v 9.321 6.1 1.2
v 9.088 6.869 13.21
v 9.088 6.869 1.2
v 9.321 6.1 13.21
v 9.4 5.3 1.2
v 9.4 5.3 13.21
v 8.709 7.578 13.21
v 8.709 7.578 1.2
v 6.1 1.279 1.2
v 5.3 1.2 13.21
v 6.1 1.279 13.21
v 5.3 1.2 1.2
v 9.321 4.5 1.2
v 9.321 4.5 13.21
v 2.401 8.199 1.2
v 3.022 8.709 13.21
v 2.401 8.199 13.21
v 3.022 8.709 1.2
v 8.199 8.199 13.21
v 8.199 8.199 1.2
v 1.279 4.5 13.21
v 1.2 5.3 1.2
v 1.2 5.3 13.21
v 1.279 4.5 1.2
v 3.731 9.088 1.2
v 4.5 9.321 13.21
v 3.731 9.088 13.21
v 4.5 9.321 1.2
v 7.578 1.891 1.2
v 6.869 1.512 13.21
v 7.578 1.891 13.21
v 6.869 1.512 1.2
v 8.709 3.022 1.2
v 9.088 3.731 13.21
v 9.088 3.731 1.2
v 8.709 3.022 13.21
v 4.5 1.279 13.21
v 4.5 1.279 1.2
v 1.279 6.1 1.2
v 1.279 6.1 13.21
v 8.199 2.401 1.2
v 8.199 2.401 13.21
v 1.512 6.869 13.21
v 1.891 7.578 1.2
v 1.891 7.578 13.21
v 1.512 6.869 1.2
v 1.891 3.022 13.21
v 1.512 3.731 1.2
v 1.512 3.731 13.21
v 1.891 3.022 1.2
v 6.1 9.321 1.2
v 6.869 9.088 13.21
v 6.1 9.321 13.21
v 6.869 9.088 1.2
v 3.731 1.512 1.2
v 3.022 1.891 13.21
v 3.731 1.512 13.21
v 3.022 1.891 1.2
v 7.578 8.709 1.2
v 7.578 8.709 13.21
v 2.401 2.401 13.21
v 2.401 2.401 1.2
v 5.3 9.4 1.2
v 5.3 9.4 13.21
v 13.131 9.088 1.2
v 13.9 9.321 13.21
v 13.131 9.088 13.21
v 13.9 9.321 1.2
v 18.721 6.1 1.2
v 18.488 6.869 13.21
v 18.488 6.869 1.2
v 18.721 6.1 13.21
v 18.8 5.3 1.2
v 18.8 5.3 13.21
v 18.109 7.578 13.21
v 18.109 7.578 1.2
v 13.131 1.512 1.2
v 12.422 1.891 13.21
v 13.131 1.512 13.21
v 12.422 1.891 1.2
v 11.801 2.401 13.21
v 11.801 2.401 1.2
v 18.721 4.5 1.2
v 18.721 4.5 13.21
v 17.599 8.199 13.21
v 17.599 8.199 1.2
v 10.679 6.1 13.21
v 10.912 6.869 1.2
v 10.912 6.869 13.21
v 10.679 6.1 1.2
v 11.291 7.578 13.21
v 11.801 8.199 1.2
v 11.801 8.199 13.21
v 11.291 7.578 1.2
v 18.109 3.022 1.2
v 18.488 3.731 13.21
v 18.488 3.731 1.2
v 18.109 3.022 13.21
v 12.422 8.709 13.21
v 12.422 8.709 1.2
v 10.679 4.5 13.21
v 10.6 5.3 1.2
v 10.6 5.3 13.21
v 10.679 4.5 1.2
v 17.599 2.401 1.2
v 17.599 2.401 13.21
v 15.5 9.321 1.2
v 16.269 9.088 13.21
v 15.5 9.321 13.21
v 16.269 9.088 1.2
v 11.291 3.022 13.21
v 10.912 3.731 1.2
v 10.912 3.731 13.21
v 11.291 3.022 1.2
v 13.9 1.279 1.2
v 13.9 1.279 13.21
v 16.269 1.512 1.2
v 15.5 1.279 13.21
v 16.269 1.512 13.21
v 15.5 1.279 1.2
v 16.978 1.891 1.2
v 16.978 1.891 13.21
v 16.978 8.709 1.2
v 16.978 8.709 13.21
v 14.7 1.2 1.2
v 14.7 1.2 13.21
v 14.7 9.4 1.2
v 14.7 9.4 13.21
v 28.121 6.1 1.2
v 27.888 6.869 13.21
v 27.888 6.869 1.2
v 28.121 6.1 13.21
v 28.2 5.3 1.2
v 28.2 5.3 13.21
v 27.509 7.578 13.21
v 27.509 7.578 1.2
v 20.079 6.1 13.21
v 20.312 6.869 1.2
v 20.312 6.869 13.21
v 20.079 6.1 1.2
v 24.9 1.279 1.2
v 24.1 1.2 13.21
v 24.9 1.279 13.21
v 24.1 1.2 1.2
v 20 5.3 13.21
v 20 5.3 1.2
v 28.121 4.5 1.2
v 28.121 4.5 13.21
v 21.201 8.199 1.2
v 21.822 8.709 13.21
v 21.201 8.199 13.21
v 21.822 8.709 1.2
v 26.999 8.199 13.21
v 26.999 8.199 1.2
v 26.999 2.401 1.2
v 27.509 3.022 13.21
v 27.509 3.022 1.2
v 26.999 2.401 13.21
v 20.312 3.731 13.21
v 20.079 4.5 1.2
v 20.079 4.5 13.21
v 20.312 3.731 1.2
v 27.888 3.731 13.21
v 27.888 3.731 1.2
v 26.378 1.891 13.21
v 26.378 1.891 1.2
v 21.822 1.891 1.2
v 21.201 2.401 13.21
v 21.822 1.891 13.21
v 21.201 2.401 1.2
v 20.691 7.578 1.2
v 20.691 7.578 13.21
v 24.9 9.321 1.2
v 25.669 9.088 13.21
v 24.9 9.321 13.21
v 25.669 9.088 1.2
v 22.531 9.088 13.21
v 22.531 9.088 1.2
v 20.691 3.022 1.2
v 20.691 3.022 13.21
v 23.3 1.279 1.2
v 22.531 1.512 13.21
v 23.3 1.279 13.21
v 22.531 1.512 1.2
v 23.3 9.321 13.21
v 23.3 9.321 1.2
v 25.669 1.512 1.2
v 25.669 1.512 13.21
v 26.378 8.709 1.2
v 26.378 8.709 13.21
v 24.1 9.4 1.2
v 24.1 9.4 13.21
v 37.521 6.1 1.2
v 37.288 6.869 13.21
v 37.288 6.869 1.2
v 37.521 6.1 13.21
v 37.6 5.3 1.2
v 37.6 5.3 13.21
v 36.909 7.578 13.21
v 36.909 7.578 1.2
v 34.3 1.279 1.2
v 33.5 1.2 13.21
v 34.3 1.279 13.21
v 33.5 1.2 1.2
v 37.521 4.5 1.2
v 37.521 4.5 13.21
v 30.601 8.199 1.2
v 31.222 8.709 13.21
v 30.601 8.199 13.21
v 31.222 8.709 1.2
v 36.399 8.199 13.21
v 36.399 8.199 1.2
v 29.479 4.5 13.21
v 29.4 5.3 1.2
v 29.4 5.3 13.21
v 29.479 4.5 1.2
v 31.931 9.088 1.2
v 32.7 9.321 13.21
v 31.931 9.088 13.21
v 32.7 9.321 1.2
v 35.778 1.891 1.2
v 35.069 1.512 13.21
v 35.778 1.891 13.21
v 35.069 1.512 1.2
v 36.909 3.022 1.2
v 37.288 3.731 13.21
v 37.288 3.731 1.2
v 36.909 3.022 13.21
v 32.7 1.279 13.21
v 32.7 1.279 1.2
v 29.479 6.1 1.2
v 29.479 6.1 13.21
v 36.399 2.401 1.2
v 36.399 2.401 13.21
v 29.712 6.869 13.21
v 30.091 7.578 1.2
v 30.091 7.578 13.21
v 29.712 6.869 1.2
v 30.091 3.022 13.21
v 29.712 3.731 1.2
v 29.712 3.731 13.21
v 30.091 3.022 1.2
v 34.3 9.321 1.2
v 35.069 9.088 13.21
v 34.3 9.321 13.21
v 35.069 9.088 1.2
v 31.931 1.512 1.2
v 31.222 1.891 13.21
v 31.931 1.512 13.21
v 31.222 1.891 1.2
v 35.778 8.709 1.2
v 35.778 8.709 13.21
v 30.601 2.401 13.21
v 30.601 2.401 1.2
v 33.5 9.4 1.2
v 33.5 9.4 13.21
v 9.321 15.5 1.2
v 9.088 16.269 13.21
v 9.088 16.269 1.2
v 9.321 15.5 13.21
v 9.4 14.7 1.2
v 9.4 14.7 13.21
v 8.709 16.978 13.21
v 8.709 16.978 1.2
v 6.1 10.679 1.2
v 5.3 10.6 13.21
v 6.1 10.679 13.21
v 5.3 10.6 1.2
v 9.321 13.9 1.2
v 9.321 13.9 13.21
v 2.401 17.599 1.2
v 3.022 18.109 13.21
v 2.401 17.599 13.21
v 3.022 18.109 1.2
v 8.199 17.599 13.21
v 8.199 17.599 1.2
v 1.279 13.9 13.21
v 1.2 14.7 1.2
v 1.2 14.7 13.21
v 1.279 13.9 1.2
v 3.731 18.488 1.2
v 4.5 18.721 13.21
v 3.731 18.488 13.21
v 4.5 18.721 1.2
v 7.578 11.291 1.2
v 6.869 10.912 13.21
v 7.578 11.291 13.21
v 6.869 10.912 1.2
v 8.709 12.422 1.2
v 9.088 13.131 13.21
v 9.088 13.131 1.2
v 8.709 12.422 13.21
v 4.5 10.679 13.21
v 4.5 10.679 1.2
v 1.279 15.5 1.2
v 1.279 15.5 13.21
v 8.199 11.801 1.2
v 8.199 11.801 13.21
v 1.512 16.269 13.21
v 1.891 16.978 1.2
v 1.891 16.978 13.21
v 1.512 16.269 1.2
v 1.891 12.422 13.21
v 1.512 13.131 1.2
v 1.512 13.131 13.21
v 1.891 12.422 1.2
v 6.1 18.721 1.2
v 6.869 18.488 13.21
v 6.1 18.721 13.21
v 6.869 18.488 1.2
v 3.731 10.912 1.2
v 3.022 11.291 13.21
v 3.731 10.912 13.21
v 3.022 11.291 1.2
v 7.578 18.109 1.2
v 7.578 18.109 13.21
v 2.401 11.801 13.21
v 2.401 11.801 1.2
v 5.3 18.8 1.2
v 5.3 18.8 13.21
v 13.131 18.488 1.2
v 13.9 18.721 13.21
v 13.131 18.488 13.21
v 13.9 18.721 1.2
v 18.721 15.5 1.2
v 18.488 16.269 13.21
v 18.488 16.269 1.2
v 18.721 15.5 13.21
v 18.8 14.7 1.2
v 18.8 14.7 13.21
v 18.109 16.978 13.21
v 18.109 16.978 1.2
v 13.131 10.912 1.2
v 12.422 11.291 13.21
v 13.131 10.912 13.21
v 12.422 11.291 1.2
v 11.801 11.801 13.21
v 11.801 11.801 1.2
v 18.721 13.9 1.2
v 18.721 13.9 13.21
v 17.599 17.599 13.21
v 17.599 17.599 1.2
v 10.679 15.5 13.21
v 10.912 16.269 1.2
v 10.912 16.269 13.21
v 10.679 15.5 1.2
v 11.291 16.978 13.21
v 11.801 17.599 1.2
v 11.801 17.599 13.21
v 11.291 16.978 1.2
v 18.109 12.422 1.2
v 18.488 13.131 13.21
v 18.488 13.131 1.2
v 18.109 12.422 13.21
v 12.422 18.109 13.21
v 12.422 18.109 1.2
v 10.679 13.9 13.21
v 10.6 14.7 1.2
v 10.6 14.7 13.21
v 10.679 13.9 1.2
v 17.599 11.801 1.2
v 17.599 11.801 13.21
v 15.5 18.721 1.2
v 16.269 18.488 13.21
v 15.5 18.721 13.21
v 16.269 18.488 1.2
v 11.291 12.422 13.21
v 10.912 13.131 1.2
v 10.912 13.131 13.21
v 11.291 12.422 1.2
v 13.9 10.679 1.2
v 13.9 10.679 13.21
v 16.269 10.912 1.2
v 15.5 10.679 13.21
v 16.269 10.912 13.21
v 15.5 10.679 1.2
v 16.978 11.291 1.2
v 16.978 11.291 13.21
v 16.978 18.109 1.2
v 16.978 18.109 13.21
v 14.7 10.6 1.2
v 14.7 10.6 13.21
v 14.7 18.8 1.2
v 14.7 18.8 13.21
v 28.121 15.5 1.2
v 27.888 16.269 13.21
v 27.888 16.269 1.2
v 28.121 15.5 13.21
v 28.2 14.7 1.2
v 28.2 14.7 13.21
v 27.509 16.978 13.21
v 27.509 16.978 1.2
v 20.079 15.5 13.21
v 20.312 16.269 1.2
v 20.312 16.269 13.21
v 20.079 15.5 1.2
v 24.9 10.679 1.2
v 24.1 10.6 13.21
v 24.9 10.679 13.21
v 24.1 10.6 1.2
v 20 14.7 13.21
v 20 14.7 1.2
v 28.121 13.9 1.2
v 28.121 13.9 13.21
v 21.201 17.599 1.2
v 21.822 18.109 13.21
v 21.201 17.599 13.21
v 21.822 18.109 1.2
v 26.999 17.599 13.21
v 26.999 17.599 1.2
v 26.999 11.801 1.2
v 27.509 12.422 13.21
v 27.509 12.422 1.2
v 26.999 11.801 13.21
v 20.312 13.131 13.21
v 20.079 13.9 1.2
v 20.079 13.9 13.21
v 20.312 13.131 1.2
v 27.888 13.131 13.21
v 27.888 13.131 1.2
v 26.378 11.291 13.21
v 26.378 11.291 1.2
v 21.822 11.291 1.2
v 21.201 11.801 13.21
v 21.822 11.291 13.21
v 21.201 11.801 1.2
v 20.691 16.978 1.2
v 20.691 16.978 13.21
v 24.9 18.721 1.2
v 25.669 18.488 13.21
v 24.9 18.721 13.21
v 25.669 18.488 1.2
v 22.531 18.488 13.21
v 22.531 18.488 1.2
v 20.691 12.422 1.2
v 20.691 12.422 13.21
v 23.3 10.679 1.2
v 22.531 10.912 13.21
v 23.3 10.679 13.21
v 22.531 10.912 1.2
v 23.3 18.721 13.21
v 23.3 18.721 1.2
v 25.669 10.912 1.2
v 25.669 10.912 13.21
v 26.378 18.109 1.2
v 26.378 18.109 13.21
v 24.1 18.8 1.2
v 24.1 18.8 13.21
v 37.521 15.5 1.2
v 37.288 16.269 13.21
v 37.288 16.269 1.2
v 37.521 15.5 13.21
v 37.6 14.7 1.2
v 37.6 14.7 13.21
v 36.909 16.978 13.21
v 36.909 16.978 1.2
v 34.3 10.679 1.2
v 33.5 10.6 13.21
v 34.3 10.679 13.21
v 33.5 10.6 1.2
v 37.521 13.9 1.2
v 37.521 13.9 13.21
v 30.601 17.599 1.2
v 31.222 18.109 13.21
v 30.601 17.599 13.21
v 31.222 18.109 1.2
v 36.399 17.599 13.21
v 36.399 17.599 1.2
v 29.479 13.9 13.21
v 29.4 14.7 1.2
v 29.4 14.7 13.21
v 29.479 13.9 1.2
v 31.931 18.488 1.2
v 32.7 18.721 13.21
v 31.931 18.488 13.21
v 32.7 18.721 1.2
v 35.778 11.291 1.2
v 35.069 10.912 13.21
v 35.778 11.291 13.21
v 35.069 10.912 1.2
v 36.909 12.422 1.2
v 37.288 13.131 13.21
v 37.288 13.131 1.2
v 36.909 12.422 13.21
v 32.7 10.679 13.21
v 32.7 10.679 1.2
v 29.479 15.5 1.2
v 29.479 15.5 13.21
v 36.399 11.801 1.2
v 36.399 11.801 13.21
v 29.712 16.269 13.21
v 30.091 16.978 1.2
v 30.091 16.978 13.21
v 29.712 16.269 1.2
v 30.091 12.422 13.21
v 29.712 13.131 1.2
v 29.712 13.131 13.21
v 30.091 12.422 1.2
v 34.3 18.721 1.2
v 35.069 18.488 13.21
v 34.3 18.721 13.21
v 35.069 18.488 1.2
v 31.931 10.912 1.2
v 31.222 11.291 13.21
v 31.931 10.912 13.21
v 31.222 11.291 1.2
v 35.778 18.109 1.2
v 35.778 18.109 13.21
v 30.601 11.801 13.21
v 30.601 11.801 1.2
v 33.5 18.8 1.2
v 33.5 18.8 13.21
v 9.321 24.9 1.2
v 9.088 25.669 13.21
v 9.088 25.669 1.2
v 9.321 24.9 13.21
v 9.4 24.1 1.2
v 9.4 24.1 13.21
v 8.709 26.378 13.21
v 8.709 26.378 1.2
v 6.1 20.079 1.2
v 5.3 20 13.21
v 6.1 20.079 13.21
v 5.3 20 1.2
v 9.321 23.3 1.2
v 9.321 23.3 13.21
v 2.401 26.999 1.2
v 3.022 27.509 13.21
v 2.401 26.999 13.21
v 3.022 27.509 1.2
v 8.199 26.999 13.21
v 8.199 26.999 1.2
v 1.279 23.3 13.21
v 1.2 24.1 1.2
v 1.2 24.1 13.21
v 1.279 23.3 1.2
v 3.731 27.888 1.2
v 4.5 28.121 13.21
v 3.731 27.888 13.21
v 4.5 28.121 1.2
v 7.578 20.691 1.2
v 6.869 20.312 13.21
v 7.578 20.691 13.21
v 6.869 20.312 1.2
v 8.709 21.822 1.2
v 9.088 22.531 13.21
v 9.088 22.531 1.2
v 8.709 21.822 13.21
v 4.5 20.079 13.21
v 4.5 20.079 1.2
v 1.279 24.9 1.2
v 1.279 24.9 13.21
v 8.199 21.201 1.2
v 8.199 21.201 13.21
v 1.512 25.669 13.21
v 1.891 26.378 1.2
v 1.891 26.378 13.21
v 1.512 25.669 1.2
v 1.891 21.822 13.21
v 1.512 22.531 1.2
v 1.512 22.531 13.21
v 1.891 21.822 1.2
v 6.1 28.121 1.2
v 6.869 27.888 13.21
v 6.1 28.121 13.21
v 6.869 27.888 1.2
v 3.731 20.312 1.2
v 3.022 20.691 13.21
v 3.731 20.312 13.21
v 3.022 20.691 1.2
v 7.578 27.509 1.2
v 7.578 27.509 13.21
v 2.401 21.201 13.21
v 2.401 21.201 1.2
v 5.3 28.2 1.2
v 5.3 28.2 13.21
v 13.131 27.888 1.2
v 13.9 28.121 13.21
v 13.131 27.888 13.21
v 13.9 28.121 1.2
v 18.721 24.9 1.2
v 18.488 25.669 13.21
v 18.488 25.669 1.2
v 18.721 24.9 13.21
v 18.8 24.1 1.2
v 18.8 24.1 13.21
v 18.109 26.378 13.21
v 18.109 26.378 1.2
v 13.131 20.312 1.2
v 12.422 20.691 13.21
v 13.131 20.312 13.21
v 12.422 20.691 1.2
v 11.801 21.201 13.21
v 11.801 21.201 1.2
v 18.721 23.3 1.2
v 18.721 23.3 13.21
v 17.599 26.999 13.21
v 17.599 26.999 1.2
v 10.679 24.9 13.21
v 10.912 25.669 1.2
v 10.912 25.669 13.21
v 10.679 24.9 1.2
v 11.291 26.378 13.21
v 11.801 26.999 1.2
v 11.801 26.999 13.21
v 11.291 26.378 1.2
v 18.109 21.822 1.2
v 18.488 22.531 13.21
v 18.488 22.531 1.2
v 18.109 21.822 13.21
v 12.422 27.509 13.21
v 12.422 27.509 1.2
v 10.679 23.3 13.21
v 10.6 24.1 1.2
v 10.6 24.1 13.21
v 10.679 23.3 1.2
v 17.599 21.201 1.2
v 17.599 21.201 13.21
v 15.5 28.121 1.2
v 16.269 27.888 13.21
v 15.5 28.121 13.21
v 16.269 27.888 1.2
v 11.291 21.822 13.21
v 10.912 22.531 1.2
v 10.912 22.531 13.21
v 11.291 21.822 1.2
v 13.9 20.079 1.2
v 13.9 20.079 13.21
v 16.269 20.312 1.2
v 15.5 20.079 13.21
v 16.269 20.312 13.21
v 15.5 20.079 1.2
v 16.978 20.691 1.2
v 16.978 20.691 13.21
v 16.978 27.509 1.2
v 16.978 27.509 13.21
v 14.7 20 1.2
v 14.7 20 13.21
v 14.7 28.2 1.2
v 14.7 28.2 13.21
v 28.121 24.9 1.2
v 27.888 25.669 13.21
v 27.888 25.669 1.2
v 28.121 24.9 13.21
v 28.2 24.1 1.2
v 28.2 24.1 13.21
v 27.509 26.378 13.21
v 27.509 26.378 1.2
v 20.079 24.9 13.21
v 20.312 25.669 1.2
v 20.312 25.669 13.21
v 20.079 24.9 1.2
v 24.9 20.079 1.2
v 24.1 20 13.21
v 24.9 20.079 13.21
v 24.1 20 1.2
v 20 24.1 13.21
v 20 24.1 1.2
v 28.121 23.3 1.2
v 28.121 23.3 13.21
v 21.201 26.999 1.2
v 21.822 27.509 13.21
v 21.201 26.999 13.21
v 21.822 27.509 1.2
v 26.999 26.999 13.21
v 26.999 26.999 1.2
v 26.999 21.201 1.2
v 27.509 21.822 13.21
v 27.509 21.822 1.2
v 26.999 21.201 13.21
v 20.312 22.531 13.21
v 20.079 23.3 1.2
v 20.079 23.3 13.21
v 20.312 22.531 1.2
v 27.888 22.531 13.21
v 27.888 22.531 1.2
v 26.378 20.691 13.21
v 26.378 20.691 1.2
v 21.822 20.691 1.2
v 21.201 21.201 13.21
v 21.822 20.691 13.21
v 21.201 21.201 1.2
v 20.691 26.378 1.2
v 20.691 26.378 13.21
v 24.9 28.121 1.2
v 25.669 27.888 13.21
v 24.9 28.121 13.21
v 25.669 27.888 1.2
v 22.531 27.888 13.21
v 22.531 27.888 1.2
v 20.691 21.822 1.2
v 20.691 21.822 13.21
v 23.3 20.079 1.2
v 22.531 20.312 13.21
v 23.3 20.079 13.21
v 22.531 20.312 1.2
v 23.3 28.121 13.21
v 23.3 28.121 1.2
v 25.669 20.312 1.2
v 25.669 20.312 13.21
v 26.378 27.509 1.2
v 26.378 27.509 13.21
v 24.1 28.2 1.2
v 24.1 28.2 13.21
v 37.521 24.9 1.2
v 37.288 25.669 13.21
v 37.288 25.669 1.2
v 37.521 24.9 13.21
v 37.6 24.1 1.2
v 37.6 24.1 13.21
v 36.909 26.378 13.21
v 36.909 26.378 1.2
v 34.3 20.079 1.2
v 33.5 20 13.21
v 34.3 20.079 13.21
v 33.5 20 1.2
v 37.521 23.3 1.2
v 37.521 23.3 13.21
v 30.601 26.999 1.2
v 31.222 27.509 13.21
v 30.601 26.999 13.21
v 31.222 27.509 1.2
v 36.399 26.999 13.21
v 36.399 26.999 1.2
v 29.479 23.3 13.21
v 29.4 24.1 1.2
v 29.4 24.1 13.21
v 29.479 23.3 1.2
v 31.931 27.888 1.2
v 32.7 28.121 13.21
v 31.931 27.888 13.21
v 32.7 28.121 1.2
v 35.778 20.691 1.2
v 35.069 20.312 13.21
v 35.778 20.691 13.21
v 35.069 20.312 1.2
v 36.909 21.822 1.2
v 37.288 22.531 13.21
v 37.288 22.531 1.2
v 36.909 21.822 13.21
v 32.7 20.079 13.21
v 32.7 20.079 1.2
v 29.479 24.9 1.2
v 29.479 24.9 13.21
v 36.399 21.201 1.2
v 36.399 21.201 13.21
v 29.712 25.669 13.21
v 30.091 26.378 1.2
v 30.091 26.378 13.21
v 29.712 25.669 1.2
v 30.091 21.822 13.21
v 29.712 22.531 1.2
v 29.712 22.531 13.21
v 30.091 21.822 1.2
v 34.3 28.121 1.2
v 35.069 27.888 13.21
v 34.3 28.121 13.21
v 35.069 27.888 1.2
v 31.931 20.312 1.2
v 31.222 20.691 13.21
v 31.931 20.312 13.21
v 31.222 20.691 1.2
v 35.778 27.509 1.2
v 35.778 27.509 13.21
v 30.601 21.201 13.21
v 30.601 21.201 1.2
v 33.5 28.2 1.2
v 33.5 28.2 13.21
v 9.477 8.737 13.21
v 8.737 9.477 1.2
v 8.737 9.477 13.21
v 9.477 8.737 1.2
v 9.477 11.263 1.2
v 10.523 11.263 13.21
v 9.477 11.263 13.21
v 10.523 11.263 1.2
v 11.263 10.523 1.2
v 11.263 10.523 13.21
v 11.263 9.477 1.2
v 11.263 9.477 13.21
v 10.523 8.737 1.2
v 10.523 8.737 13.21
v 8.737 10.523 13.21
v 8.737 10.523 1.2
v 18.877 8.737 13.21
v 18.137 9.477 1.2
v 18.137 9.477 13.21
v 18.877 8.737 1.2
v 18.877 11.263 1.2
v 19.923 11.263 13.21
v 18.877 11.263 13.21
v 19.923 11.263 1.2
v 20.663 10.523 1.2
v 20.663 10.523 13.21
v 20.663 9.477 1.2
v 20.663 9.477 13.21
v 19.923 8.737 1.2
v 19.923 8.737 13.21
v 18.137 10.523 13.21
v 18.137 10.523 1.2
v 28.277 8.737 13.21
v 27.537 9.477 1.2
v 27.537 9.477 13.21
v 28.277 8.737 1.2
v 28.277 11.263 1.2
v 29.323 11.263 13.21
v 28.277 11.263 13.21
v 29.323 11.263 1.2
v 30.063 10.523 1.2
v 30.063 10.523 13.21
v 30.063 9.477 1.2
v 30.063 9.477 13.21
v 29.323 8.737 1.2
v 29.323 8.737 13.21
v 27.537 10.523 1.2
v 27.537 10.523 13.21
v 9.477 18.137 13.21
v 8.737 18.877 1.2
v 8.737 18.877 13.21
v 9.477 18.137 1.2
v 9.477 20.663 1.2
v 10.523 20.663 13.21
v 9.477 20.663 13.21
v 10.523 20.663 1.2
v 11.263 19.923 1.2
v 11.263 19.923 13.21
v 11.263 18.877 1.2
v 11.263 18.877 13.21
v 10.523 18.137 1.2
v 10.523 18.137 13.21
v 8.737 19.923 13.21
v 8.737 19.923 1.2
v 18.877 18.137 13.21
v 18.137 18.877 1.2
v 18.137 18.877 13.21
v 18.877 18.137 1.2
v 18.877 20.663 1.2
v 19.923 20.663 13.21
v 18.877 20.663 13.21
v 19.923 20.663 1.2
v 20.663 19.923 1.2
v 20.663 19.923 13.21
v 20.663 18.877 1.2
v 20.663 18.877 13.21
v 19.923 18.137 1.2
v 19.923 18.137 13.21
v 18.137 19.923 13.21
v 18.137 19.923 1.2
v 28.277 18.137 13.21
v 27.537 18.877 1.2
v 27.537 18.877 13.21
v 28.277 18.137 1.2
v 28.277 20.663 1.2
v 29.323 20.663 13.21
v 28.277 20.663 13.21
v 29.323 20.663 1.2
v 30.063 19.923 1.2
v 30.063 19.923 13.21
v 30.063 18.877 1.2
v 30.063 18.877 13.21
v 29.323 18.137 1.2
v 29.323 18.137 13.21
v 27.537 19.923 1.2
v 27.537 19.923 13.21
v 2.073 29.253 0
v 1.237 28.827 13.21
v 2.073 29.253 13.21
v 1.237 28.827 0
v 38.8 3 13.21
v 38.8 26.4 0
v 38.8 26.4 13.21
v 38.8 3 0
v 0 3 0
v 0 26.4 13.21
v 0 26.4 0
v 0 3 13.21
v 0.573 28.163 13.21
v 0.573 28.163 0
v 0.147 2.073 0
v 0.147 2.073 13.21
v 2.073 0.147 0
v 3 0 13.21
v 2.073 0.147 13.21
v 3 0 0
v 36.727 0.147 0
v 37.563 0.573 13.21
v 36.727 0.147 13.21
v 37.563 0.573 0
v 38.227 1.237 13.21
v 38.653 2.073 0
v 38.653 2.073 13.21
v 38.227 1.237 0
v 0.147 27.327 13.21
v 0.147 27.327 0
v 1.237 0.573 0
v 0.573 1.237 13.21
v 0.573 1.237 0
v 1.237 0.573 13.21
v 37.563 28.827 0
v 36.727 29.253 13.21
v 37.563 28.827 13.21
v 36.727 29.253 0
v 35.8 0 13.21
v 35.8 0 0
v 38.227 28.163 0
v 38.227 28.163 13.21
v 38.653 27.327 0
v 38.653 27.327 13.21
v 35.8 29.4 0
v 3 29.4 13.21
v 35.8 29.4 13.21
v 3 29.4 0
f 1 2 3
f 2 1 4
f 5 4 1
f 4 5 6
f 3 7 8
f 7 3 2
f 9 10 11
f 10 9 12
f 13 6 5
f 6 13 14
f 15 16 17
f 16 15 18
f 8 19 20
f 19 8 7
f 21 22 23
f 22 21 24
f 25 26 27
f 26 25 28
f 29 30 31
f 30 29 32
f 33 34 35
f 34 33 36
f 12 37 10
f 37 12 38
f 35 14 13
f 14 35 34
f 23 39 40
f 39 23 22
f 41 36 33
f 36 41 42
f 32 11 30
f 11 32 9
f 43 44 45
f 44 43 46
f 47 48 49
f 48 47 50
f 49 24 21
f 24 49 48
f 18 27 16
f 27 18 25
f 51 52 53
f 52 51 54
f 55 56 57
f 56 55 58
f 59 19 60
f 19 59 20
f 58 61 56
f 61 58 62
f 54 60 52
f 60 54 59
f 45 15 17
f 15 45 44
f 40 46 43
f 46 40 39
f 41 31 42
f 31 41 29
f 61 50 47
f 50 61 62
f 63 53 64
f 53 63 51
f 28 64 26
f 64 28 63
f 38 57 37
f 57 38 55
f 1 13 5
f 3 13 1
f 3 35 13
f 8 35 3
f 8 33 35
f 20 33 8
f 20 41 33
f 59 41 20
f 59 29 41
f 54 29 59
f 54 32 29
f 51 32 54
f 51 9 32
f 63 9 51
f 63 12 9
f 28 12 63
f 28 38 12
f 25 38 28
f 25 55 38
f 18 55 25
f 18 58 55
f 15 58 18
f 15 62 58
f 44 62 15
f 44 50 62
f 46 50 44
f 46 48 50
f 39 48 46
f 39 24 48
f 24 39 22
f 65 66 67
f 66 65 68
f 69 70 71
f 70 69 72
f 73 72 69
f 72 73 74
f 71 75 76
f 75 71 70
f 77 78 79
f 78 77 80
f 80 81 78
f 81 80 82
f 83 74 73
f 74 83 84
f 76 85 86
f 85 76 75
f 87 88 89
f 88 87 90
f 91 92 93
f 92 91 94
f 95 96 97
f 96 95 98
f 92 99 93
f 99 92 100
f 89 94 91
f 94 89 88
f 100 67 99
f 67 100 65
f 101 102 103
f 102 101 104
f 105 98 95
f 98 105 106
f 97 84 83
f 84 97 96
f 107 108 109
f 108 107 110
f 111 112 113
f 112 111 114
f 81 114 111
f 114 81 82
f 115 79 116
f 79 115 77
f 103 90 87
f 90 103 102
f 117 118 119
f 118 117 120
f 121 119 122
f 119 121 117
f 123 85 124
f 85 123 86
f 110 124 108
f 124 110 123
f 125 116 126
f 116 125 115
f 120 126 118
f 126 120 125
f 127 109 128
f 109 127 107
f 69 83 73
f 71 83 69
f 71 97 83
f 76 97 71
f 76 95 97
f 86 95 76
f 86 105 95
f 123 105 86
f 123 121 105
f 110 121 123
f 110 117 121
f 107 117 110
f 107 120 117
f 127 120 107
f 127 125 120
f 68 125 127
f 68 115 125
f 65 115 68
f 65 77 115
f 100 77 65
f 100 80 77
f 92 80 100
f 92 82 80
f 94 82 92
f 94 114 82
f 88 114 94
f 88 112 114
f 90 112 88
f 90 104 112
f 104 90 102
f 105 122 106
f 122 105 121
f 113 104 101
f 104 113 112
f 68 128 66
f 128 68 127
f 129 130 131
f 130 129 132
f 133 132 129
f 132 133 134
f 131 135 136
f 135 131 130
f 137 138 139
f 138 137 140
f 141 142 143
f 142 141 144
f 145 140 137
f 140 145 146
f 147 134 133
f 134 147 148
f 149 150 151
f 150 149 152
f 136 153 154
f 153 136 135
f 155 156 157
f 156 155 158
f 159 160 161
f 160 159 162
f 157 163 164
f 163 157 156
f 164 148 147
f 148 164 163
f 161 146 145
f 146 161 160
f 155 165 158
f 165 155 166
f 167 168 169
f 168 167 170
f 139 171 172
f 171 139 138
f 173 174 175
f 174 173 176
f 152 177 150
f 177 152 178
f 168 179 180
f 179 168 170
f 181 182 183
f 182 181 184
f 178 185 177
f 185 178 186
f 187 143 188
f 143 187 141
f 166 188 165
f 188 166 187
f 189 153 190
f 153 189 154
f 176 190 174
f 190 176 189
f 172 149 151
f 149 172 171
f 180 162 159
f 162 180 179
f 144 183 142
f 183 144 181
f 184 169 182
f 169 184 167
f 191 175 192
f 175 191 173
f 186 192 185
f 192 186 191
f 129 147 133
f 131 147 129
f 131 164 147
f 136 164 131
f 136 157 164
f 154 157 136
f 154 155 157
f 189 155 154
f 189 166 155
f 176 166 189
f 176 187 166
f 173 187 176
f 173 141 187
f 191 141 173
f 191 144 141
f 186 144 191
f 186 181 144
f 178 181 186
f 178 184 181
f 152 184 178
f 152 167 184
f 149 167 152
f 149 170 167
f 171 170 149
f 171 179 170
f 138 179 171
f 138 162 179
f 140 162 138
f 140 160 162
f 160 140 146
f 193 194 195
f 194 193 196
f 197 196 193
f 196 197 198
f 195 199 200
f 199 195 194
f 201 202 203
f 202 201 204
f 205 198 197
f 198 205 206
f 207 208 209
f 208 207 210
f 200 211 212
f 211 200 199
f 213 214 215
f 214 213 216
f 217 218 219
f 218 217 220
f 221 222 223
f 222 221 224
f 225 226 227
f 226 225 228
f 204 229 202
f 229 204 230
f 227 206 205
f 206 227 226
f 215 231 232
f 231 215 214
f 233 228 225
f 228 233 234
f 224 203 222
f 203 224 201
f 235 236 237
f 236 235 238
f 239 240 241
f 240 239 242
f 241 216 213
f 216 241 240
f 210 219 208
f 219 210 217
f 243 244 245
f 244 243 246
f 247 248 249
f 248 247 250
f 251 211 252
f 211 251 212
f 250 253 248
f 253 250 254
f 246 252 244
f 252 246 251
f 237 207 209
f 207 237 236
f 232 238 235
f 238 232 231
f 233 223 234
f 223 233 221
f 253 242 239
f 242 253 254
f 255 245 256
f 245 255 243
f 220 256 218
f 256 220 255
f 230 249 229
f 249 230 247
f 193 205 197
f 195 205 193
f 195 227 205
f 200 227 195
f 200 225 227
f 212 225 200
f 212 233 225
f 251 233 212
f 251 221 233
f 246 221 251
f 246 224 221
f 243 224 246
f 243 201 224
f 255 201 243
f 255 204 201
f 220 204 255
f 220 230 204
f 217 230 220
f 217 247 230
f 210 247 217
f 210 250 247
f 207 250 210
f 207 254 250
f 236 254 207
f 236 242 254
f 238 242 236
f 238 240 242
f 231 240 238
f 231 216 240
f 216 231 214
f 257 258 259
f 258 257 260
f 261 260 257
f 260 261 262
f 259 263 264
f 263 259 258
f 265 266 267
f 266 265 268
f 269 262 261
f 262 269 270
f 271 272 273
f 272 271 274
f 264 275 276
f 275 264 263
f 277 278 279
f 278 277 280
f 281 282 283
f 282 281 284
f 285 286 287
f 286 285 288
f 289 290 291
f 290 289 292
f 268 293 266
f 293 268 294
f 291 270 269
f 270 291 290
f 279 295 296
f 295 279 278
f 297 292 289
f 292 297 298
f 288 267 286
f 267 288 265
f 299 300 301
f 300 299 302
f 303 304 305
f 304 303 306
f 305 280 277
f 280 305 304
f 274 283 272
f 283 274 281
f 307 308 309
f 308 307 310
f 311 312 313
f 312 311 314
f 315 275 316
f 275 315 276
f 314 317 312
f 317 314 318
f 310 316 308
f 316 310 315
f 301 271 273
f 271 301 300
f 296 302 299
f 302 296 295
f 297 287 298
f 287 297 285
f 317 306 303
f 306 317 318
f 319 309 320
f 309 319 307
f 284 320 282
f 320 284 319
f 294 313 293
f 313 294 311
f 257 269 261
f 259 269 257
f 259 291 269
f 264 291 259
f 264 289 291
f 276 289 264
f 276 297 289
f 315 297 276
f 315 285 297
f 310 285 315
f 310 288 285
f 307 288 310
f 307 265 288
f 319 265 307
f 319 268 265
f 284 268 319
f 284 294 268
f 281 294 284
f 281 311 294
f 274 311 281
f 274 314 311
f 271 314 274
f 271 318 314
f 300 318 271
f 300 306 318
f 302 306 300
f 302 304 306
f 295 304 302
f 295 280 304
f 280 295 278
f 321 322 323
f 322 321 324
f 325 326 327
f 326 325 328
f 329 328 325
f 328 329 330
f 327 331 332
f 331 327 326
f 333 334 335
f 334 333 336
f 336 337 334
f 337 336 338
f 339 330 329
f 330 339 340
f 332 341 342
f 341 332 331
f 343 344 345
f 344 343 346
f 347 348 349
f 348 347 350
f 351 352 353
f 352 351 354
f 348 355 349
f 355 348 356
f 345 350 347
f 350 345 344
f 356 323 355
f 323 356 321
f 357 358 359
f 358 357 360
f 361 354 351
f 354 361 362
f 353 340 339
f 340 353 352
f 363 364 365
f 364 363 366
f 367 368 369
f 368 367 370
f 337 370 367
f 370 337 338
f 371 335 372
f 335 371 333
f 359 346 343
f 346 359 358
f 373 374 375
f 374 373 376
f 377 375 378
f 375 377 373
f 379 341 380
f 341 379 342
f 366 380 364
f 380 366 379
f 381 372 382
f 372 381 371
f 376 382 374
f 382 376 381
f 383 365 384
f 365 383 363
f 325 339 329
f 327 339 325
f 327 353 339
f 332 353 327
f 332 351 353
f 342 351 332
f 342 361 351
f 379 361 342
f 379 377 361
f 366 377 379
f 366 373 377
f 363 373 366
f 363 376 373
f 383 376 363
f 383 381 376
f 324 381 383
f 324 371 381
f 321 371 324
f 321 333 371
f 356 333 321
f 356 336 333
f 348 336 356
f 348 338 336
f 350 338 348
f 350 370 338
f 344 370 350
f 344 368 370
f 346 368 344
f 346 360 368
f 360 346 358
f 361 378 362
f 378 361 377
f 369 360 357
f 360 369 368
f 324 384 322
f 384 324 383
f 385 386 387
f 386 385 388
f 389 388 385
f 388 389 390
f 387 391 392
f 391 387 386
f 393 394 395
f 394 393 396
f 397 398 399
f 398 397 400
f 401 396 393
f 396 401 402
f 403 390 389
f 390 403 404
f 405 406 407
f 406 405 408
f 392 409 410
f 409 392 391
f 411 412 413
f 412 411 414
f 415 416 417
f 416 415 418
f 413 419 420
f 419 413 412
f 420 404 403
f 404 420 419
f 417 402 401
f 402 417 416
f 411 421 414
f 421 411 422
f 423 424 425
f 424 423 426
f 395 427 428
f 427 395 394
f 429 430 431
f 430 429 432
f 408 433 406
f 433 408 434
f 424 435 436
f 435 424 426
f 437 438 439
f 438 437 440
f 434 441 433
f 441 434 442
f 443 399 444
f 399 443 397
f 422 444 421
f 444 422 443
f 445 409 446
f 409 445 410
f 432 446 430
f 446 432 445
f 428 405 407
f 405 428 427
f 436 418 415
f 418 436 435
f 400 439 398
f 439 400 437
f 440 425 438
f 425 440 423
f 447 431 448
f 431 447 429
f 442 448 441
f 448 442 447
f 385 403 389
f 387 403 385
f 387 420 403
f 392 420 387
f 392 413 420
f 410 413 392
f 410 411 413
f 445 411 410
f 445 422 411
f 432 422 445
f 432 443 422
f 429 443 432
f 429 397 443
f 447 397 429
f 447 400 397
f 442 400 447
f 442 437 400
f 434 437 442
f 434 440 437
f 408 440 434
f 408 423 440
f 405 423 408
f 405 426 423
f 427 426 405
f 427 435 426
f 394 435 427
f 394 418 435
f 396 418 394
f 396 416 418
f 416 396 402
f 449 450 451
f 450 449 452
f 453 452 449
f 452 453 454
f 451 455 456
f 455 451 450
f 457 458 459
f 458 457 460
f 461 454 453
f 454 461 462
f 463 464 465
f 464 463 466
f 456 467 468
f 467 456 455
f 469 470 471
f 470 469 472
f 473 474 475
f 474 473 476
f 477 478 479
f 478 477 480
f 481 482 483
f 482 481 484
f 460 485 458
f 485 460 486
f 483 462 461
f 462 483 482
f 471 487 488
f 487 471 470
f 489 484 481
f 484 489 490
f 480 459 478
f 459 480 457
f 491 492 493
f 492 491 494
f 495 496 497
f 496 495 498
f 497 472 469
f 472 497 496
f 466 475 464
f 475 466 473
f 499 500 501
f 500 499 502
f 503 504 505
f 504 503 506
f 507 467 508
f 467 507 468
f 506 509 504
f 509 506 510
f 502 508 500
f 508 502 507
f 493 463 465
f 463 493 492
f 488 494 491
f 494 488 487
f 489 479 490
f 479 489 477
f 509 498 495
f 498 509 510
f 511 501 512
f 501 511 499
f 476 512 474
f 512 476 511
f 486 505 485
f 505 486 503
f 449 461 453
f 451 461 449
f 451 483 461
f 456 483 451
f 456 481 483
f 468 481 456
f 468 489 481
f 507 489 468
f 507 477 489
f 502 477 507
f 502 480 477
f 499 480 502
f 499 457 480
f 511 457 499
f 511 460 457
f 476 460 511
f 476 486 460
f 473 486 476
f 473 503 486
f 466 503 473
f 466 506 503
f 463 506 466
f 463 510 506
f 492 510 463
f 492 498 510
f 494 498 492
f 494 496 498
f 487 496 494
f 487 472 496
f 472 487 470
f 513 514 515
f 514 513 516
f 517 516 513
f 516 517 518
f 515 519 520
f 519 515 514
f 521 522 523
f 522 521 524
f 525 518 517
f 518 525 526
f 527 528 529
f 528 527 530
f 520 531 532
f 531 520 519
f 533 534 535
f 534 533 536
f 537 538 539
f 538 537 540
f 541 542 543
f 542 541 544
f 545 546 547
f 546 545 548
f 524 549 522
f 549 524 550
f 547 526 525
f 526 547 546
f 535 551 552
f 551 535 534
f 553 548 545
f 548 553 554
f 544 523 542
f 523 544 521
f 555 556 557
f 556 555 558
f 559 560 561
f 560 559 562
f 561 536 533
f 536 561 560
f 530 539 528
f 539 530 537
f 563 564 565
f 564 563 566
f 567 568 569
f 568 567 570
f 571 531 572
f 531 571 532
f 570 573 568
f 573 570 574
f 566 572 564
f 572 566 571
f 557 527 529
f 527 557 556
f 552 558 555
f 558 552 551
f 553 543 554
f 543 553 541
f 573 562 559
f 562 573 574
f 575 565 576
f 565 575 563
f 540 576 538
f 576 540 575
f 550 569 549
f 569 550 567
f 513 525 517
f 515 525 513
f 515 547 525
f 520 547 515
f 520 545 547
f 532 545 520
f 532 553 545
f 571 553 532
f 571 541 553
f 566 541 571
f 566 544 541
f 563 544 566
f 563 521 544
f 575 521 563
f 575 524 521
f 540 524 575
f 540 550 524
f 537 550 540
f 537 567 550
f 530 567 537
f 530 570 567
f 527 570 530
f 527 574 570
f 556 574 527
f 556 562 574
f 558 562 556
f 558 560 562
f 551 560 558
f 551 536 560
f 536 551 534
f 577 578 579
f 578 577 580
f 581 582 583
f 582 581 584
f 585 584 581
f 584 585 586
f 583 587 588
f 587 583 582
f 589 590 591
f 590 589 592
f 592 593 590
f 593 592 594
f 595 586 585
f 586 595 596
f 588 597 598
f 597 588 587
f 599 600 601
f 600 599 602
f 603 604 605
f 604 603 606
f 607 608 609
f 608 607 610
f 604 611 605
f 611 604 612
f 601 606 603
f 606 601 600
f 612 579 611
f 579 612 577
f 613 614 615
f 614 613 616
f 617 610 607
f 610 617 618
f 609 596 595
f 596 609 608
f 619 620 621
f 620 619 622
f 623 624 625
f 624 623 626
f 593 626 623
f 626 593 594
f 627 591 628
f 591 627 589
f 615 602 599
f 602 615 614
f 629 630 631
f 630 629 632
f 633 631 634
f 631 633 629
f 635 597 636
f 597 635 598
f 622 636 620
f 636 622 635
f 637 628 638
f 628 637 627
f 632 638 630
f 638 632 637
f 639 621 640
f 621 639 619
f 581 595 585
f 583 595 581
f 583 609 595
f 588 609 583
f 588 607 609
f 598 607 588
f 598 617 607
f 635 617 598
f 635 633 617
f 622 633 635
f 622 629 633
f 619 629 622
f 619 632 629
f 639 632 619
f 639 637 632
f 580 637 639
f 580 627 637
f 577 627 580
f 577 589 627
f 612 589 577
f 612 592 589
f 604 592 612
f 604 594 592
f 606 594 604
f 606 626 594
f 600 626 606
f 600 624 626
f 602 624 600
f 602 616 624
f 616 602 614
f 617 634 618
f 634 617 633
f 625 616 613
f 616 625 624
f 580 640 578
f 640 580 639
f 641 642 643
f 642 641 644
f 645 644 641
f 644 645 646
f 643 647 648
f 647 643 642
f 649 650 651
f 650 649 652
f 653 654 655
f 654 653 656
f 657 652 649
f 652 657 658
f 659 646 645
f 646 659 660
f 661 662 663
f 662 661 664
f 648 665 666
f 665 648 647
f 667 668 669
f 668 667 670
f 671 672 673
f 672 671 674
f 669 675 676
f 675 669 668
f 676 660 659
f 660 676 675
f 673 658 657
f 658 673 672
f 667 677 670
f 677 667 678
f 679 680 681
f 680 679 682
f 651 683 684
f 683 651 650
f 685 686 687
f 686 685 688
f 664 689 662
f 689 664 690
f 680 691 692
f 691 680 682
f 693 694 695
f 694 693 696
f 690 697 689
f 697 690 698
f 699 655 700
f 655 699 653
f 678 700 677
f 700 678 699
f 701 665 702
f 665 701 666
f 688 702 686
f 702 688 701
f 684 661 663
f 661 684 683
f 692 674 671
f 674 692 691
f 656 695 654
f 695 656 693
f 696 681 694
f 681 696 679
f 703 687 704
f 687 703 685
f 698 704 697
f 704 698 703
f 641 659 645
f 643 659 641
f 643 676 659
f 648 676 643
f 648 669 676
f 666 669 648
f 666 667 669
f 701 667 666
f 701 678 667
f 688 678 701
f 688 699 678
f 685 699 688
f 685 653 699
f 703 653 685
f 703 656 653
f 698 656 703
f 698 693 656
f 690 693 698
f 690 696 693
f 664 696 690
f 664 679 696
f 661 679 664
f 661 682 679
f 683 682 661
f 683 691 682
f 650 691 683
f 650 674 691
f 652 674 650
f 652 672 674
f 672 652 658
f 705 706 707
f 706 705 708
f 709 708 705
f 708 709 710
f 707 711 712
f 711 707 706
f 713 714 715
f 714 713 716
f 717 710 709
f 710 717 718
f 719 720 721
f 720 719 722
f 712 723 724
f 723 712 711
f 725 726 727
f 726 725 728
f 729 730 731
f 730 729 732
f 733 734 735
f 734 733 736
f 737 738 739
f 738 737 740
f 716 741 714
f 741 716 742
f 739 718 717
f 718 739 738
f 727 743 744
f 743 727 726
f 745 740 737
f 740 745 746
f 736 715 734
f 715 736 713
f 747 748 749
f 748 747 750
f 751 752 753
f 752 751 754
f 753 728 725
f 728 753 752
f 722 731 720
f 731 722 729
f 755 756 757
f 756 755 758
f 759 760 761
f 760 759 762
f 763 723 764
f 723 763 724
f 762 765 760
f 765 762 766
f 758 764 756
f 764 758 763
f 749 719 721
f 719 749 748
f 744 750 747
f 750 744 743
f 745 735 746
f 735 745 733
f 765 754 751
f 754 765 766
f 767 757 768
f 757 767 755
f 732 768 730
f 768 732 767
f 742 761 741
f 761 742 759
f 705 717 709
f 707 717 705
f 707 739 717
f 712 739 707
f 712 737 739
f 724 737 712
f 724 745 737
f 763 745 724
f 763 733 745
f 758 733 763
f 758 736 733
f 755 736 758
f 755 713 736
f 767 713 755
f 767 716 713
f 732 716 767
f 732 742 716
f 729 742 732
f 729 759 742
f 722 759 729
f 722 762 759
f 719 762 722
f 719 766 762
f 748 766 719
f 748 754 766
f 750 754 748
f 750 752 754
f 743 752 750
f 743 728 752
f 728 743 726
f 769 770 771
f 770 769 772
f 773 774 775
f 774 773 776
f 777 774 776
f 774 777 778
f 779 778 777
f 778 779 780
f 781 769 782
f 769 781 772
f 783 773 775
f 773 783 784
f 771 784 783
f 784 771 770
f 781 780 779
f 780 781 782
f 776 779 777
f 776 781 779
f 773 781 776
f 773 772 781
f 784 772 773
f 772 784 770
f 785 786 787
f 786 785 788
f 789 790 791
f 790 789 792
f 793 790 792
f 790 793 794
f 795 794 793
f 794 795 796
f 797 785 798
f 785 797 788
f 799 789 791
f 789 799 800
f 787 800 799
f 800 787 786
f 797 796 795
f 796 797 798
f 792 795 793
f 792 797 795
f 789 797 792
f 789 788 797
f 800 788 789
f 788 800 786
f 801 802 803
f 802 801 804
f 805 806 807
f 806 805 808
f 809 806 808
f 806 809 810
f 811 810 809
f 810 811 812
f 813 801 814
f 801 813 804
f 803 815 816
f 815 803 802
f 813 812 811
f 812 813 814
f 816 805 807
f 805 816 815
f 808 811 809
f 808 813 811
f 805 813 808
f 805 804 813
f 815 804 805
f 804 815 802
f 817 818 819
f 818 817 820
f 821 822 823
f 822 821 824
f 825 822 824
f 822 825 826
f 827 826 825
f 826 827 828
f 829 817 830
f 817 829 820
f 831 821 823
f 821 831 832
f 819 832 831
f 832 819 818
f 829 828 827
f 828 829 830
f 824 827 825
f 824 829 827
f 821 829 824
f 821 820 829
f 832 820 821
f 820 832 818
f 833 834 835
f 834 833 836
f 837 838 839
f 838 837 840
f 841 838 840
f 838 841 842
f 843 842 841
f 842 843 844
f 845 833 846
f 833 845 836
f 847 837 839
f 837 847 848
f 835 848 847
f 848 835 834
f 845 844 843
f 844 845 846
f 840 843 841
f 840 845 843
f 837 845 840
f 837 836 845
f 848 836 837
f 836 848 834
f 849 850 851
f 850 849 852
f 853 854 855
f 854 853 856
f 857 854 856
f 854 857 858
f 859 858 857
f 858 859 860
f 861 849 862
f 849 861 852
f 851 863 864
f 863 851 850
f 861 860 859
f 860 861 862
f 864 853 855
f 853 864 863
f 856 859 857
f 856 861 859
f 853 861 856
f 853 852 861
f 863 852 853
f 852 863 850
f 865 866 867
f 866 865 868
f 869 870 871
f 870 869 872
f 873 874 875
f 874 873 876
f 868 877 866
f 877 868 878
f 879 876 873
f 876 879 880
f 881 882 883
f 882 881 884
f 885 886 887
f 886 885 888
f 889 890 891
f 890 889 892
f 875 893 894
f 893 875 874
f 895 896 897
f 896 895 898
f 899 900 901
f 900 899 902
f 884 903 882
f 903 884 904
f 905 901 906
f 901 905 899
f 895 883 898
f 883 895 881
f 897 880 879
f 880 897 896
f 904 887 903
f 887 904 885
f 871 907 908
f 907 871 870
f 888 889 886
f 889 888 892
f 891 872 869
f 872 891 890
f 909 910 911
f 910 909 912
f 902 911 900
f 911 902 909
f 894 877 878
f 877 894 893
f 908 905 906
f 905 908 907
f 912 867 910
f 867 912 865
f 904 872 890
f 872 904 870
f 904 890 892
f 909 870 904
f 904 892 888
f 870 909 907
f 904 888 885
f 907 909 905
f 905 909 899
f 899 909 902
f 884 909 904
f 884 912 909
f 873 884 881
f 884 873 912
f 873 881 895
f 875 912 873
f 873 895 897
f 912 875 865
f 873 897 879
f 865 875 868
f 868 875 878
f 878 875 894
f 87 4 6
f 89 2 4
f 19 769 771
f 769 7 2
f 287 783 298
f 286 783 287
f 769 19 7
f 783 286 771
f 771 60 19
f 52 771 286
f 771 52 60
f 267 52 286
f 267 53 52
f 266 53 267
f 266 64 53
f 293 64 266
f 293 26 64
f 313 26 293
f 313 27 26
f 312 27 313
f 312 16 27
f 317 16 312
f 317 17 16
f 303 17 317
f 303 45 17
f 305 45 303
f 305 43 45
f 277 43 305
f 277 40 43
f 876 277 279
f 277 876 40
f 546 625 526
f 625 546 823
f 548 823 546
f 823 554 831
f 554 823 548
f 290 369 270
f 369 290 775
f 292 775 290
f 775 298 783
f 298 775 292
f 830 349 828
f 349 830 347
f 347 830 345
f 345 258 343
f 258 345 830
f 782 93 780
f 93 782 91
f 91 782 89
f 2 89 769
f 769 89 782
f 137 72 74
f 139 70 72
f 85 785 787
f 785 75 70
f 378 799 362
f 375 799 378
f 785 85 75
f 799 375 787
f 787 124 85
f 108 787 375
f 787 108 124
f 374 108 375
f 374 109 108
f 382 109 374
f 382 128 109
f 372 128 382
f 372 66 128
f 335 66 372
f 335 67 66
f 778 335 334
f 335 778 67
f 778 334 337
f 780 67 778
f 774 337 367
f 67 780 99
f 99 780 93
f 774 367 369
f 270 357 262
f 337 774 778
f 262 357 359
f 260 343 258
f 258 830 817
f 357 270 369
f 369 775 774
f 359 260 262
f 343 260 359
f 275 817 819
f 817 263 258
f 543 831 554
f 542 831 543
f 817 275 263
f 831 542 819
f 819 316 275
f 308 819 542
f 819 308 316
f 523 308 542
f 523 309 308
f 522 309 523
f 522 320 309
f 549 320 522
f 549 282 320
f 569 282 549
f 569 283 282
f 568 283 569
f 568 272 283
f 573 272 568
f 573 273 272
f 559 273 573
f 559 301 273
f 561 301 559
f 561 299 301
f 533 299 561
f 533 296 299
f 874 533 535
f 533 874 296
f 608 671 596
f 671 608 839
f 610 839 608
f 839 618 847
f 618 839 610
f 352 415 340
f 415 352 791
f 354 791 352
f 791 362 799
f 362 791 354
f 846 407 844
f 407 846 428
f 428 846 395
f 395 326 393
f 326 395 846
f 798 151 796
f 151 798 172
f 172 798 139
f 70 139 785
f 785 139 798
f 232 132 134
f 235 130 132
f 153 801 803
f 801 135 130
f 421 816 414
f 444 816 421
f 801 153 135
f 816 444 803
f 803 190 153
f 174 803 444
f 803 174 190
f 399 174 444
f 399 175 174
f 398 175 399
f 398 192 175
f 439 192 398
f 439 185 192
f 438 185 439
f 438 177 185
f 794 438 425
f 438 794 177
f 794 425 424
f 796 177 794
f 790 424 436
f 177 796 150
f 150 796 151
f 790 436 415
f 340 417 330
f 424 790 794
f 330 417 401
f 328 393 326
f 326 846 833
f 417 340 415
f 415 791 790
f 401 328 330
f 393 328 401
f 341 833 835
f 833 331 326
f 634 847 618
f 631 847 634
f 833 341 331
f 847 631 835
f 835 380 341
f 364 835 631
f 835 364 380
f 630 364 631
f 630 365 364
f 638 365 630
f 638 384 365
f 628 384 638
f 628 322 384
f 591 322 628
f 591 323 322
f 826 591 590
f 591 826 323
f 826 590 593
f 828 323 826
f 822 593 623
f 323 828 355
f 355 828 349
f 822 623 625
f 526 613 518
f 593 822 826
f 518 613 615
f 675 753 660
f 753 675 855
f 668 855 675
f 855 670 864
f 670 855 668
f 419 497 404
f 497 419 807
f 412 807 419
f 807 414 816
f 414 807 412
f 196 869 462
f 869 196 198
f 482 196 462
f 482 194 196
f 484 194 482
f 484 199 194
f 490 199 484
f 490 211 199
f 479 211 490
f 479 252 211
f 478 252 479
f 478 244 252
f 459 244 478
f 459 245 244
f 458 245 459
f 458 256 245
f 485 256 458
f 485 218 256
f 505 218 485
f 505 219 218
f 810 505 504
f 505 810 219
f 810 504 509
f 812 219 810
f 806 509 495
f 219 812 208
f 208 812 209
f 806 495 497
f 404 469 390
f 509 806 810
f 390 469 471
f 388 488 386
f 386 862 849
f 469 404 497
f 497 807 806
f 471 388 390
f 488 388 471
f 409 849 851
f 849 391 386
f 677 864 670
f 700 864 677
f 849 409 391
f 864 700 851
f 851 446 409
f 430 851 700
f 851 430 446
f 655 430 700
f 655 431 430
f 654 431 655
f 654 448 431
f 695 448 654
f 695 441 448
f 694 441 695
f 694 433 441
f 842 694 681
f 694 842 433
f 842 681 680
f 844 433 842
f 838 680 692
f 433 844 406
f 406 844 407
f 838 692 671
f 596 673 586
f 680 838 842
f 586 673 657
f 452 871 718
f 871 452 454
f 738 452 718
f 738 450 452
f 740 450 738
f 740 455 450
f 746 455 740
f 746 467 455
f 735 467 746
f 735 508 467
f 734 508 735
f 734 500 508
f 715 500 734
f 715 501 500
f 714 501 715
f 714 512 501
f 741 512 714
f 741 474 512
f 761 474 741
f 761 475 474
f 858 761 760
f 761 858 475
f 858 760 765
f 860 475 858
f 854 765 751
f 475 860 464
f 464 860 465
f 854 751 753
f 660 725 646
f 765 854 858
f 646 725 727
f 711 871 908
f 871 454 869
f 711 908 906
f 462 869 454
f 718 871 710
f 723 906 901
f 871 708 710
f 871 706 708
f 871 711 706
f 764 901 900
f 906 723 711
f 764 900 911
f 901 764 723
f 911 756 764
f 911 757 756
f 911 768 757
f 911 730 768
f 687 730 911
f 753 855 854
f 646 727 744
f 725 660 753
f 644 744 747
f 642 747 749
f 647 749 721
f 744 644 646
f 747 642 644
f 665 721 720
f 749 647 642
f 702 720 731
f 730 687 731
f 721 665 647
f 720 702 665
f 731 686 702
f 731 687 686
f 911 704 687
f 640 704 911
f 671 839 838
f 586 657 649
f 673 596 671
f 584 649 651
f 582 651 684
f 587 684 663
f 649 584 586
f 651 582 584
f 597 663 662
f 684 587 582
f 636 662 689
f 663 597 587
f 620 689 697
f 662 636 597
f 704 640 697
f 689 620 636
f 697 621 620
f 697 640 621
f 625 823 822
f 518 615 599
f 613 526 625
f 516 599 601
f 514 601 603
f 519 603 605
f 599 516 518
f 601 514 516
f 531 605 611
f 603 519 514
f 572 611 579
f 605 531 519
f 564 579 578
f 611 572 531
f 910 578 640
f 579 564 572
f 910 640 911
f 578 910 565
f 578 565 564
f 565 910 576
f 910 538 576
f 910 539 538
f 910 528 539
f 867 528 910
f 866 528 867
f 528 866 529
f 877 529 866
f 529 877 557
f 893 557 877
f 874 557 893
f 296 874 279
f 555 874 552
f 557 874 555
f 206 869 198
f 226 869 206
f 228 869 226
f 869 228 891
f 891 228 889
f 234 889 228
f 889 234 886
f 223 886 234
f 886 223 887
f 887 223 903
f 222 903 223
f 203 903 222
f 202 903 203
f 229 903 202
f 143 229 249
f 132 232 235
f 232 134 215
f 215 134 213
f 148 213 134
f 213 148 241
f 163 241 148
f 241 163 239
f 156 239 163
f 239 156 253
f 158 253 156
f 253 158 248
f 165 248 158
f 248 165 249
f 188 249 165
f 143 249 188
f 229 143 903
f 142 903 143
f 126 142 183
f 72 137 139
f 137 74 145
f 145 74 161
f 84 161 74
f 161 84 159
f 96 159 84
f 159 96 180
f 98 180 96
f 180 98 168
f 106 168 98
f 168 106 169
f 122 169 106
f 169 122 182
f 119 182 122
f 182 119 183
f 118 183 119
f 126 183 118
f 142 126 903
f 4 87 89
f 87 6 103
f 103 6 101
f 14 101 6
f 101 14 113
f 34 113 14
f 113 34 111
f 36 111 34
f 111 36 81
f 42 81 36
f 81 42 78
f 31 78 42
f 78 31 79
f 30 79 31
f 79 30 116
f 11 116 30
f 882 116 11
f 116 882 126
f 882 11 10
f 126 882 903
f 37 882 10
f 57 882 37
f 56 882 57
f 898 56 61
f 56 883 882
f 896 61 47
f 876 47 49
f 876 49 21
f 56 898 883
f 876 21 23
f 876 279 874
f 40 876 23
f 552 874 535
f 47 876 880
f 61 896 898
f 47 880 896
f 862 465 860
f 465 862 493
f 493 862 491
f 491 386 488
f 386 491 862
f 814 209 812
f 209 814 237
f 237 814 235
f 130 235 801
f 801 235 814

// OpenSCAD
// diameter (mm) of holes or sides of square.  Increase this to include printer error
_diam = 8.2;             
// depth of holes (mm)
_depth = 12;                
// num of columns of holes
_cols = 4;                  
// num of rows of holes
_rows = 3;                  

// hole shape
_strShape = "circle";   //[circle,square,hex]  
// radius of rounded edges on tray.  If hole shape is squares, use 0 or small number.
_rad_rounded_edge = 3;      
// should small holes be placed to save on print material?
_add_intersect_holes = 1; // [1:yes,0:no]

function int_to_bool(n) = n == 1 ? true : false; 

module hole(diam, depth, strShape)
{
    if(strShape == "circle")
    {
        cylinder(depth,d=diam, $fn=diam*4);
    }
    else if (strShape == "square")
    {
        translate([-diam/2,-diam/2,0]) cube([diam, diam, depth]);
    }
    else if (strShape == "hex")
    {
        rotate([0,0,15]) cylinder(depth,d=diam, $fn=6);
    }
    
}
module hole_array(diam, depth, cols, rows, strShape)
{
    for(r=[0: rows - 1])
    {
        translate([0, r * (diam + 1.2),0])
        for(c=[0: cols - 1])
        {
            translate([c * (diam + 1.2) ,0,1.2]) hole(diam, depth + .1, strShape);
        }
    }
}
module intersect_hole(diam, depth)
{
    rotate([0,0,360/16]) cylinder(depth, d=diam/3, $fn=8);
    //diam, depth, cols, rows
}
module intersect_hole_array(diam, depth, cols, rows)
{
    for(r=[0: rows - 2])
    {
        translate([0, r * (diam + 1.2),0])
        for(c=[0: cols - 2])
        {
            translate([c * (diam + 1.2) ,0,1.2]) intersect_hole(diam, depth + .1);
        }
    }
}
module tray(diam=10, depth=10, cols=2, rows =2, strShape = "square", rad_rounded_edge = 0, add_intersect_holes = false)
{
    
    difference()
    {   
        minkowski()
        {
            translate([rad_rounded_edge,rad_rounded_edge,0])
            cube([  ( (diam * cols) + (cols * 1.2) + (1 * 1.2) - (2*rad_rounded_edge))  , 
                      ( (diam * rows) + (rows * 1.2) + (1 * 1.2) - (2*rad_rounded_edge)) , 
                        depth + 1.2]);
            cylinder(.01,r=rad_rounded_edge, $fn=20);
        }
        translate([(diam/2) + 1.2, (diam/2) + 1.2, 0]) 
            hole_array(diam, depth, cols, rows, strShape);
        
        if(add_intersect_holes == true)
        {
            translate([diam + ( 1.2 + (1.2/2)) , diam + ( 1.2 + (1.2/2)) ,0])
            intersect_hole_array(_diam, _depth,_cols,_rows);
        }
    }
}

// output the tray
tray(_diam, _depth, _cols, _rows, _strShape, _rad_rounded_edge, int_to_bool(_add_intersect_holes));
